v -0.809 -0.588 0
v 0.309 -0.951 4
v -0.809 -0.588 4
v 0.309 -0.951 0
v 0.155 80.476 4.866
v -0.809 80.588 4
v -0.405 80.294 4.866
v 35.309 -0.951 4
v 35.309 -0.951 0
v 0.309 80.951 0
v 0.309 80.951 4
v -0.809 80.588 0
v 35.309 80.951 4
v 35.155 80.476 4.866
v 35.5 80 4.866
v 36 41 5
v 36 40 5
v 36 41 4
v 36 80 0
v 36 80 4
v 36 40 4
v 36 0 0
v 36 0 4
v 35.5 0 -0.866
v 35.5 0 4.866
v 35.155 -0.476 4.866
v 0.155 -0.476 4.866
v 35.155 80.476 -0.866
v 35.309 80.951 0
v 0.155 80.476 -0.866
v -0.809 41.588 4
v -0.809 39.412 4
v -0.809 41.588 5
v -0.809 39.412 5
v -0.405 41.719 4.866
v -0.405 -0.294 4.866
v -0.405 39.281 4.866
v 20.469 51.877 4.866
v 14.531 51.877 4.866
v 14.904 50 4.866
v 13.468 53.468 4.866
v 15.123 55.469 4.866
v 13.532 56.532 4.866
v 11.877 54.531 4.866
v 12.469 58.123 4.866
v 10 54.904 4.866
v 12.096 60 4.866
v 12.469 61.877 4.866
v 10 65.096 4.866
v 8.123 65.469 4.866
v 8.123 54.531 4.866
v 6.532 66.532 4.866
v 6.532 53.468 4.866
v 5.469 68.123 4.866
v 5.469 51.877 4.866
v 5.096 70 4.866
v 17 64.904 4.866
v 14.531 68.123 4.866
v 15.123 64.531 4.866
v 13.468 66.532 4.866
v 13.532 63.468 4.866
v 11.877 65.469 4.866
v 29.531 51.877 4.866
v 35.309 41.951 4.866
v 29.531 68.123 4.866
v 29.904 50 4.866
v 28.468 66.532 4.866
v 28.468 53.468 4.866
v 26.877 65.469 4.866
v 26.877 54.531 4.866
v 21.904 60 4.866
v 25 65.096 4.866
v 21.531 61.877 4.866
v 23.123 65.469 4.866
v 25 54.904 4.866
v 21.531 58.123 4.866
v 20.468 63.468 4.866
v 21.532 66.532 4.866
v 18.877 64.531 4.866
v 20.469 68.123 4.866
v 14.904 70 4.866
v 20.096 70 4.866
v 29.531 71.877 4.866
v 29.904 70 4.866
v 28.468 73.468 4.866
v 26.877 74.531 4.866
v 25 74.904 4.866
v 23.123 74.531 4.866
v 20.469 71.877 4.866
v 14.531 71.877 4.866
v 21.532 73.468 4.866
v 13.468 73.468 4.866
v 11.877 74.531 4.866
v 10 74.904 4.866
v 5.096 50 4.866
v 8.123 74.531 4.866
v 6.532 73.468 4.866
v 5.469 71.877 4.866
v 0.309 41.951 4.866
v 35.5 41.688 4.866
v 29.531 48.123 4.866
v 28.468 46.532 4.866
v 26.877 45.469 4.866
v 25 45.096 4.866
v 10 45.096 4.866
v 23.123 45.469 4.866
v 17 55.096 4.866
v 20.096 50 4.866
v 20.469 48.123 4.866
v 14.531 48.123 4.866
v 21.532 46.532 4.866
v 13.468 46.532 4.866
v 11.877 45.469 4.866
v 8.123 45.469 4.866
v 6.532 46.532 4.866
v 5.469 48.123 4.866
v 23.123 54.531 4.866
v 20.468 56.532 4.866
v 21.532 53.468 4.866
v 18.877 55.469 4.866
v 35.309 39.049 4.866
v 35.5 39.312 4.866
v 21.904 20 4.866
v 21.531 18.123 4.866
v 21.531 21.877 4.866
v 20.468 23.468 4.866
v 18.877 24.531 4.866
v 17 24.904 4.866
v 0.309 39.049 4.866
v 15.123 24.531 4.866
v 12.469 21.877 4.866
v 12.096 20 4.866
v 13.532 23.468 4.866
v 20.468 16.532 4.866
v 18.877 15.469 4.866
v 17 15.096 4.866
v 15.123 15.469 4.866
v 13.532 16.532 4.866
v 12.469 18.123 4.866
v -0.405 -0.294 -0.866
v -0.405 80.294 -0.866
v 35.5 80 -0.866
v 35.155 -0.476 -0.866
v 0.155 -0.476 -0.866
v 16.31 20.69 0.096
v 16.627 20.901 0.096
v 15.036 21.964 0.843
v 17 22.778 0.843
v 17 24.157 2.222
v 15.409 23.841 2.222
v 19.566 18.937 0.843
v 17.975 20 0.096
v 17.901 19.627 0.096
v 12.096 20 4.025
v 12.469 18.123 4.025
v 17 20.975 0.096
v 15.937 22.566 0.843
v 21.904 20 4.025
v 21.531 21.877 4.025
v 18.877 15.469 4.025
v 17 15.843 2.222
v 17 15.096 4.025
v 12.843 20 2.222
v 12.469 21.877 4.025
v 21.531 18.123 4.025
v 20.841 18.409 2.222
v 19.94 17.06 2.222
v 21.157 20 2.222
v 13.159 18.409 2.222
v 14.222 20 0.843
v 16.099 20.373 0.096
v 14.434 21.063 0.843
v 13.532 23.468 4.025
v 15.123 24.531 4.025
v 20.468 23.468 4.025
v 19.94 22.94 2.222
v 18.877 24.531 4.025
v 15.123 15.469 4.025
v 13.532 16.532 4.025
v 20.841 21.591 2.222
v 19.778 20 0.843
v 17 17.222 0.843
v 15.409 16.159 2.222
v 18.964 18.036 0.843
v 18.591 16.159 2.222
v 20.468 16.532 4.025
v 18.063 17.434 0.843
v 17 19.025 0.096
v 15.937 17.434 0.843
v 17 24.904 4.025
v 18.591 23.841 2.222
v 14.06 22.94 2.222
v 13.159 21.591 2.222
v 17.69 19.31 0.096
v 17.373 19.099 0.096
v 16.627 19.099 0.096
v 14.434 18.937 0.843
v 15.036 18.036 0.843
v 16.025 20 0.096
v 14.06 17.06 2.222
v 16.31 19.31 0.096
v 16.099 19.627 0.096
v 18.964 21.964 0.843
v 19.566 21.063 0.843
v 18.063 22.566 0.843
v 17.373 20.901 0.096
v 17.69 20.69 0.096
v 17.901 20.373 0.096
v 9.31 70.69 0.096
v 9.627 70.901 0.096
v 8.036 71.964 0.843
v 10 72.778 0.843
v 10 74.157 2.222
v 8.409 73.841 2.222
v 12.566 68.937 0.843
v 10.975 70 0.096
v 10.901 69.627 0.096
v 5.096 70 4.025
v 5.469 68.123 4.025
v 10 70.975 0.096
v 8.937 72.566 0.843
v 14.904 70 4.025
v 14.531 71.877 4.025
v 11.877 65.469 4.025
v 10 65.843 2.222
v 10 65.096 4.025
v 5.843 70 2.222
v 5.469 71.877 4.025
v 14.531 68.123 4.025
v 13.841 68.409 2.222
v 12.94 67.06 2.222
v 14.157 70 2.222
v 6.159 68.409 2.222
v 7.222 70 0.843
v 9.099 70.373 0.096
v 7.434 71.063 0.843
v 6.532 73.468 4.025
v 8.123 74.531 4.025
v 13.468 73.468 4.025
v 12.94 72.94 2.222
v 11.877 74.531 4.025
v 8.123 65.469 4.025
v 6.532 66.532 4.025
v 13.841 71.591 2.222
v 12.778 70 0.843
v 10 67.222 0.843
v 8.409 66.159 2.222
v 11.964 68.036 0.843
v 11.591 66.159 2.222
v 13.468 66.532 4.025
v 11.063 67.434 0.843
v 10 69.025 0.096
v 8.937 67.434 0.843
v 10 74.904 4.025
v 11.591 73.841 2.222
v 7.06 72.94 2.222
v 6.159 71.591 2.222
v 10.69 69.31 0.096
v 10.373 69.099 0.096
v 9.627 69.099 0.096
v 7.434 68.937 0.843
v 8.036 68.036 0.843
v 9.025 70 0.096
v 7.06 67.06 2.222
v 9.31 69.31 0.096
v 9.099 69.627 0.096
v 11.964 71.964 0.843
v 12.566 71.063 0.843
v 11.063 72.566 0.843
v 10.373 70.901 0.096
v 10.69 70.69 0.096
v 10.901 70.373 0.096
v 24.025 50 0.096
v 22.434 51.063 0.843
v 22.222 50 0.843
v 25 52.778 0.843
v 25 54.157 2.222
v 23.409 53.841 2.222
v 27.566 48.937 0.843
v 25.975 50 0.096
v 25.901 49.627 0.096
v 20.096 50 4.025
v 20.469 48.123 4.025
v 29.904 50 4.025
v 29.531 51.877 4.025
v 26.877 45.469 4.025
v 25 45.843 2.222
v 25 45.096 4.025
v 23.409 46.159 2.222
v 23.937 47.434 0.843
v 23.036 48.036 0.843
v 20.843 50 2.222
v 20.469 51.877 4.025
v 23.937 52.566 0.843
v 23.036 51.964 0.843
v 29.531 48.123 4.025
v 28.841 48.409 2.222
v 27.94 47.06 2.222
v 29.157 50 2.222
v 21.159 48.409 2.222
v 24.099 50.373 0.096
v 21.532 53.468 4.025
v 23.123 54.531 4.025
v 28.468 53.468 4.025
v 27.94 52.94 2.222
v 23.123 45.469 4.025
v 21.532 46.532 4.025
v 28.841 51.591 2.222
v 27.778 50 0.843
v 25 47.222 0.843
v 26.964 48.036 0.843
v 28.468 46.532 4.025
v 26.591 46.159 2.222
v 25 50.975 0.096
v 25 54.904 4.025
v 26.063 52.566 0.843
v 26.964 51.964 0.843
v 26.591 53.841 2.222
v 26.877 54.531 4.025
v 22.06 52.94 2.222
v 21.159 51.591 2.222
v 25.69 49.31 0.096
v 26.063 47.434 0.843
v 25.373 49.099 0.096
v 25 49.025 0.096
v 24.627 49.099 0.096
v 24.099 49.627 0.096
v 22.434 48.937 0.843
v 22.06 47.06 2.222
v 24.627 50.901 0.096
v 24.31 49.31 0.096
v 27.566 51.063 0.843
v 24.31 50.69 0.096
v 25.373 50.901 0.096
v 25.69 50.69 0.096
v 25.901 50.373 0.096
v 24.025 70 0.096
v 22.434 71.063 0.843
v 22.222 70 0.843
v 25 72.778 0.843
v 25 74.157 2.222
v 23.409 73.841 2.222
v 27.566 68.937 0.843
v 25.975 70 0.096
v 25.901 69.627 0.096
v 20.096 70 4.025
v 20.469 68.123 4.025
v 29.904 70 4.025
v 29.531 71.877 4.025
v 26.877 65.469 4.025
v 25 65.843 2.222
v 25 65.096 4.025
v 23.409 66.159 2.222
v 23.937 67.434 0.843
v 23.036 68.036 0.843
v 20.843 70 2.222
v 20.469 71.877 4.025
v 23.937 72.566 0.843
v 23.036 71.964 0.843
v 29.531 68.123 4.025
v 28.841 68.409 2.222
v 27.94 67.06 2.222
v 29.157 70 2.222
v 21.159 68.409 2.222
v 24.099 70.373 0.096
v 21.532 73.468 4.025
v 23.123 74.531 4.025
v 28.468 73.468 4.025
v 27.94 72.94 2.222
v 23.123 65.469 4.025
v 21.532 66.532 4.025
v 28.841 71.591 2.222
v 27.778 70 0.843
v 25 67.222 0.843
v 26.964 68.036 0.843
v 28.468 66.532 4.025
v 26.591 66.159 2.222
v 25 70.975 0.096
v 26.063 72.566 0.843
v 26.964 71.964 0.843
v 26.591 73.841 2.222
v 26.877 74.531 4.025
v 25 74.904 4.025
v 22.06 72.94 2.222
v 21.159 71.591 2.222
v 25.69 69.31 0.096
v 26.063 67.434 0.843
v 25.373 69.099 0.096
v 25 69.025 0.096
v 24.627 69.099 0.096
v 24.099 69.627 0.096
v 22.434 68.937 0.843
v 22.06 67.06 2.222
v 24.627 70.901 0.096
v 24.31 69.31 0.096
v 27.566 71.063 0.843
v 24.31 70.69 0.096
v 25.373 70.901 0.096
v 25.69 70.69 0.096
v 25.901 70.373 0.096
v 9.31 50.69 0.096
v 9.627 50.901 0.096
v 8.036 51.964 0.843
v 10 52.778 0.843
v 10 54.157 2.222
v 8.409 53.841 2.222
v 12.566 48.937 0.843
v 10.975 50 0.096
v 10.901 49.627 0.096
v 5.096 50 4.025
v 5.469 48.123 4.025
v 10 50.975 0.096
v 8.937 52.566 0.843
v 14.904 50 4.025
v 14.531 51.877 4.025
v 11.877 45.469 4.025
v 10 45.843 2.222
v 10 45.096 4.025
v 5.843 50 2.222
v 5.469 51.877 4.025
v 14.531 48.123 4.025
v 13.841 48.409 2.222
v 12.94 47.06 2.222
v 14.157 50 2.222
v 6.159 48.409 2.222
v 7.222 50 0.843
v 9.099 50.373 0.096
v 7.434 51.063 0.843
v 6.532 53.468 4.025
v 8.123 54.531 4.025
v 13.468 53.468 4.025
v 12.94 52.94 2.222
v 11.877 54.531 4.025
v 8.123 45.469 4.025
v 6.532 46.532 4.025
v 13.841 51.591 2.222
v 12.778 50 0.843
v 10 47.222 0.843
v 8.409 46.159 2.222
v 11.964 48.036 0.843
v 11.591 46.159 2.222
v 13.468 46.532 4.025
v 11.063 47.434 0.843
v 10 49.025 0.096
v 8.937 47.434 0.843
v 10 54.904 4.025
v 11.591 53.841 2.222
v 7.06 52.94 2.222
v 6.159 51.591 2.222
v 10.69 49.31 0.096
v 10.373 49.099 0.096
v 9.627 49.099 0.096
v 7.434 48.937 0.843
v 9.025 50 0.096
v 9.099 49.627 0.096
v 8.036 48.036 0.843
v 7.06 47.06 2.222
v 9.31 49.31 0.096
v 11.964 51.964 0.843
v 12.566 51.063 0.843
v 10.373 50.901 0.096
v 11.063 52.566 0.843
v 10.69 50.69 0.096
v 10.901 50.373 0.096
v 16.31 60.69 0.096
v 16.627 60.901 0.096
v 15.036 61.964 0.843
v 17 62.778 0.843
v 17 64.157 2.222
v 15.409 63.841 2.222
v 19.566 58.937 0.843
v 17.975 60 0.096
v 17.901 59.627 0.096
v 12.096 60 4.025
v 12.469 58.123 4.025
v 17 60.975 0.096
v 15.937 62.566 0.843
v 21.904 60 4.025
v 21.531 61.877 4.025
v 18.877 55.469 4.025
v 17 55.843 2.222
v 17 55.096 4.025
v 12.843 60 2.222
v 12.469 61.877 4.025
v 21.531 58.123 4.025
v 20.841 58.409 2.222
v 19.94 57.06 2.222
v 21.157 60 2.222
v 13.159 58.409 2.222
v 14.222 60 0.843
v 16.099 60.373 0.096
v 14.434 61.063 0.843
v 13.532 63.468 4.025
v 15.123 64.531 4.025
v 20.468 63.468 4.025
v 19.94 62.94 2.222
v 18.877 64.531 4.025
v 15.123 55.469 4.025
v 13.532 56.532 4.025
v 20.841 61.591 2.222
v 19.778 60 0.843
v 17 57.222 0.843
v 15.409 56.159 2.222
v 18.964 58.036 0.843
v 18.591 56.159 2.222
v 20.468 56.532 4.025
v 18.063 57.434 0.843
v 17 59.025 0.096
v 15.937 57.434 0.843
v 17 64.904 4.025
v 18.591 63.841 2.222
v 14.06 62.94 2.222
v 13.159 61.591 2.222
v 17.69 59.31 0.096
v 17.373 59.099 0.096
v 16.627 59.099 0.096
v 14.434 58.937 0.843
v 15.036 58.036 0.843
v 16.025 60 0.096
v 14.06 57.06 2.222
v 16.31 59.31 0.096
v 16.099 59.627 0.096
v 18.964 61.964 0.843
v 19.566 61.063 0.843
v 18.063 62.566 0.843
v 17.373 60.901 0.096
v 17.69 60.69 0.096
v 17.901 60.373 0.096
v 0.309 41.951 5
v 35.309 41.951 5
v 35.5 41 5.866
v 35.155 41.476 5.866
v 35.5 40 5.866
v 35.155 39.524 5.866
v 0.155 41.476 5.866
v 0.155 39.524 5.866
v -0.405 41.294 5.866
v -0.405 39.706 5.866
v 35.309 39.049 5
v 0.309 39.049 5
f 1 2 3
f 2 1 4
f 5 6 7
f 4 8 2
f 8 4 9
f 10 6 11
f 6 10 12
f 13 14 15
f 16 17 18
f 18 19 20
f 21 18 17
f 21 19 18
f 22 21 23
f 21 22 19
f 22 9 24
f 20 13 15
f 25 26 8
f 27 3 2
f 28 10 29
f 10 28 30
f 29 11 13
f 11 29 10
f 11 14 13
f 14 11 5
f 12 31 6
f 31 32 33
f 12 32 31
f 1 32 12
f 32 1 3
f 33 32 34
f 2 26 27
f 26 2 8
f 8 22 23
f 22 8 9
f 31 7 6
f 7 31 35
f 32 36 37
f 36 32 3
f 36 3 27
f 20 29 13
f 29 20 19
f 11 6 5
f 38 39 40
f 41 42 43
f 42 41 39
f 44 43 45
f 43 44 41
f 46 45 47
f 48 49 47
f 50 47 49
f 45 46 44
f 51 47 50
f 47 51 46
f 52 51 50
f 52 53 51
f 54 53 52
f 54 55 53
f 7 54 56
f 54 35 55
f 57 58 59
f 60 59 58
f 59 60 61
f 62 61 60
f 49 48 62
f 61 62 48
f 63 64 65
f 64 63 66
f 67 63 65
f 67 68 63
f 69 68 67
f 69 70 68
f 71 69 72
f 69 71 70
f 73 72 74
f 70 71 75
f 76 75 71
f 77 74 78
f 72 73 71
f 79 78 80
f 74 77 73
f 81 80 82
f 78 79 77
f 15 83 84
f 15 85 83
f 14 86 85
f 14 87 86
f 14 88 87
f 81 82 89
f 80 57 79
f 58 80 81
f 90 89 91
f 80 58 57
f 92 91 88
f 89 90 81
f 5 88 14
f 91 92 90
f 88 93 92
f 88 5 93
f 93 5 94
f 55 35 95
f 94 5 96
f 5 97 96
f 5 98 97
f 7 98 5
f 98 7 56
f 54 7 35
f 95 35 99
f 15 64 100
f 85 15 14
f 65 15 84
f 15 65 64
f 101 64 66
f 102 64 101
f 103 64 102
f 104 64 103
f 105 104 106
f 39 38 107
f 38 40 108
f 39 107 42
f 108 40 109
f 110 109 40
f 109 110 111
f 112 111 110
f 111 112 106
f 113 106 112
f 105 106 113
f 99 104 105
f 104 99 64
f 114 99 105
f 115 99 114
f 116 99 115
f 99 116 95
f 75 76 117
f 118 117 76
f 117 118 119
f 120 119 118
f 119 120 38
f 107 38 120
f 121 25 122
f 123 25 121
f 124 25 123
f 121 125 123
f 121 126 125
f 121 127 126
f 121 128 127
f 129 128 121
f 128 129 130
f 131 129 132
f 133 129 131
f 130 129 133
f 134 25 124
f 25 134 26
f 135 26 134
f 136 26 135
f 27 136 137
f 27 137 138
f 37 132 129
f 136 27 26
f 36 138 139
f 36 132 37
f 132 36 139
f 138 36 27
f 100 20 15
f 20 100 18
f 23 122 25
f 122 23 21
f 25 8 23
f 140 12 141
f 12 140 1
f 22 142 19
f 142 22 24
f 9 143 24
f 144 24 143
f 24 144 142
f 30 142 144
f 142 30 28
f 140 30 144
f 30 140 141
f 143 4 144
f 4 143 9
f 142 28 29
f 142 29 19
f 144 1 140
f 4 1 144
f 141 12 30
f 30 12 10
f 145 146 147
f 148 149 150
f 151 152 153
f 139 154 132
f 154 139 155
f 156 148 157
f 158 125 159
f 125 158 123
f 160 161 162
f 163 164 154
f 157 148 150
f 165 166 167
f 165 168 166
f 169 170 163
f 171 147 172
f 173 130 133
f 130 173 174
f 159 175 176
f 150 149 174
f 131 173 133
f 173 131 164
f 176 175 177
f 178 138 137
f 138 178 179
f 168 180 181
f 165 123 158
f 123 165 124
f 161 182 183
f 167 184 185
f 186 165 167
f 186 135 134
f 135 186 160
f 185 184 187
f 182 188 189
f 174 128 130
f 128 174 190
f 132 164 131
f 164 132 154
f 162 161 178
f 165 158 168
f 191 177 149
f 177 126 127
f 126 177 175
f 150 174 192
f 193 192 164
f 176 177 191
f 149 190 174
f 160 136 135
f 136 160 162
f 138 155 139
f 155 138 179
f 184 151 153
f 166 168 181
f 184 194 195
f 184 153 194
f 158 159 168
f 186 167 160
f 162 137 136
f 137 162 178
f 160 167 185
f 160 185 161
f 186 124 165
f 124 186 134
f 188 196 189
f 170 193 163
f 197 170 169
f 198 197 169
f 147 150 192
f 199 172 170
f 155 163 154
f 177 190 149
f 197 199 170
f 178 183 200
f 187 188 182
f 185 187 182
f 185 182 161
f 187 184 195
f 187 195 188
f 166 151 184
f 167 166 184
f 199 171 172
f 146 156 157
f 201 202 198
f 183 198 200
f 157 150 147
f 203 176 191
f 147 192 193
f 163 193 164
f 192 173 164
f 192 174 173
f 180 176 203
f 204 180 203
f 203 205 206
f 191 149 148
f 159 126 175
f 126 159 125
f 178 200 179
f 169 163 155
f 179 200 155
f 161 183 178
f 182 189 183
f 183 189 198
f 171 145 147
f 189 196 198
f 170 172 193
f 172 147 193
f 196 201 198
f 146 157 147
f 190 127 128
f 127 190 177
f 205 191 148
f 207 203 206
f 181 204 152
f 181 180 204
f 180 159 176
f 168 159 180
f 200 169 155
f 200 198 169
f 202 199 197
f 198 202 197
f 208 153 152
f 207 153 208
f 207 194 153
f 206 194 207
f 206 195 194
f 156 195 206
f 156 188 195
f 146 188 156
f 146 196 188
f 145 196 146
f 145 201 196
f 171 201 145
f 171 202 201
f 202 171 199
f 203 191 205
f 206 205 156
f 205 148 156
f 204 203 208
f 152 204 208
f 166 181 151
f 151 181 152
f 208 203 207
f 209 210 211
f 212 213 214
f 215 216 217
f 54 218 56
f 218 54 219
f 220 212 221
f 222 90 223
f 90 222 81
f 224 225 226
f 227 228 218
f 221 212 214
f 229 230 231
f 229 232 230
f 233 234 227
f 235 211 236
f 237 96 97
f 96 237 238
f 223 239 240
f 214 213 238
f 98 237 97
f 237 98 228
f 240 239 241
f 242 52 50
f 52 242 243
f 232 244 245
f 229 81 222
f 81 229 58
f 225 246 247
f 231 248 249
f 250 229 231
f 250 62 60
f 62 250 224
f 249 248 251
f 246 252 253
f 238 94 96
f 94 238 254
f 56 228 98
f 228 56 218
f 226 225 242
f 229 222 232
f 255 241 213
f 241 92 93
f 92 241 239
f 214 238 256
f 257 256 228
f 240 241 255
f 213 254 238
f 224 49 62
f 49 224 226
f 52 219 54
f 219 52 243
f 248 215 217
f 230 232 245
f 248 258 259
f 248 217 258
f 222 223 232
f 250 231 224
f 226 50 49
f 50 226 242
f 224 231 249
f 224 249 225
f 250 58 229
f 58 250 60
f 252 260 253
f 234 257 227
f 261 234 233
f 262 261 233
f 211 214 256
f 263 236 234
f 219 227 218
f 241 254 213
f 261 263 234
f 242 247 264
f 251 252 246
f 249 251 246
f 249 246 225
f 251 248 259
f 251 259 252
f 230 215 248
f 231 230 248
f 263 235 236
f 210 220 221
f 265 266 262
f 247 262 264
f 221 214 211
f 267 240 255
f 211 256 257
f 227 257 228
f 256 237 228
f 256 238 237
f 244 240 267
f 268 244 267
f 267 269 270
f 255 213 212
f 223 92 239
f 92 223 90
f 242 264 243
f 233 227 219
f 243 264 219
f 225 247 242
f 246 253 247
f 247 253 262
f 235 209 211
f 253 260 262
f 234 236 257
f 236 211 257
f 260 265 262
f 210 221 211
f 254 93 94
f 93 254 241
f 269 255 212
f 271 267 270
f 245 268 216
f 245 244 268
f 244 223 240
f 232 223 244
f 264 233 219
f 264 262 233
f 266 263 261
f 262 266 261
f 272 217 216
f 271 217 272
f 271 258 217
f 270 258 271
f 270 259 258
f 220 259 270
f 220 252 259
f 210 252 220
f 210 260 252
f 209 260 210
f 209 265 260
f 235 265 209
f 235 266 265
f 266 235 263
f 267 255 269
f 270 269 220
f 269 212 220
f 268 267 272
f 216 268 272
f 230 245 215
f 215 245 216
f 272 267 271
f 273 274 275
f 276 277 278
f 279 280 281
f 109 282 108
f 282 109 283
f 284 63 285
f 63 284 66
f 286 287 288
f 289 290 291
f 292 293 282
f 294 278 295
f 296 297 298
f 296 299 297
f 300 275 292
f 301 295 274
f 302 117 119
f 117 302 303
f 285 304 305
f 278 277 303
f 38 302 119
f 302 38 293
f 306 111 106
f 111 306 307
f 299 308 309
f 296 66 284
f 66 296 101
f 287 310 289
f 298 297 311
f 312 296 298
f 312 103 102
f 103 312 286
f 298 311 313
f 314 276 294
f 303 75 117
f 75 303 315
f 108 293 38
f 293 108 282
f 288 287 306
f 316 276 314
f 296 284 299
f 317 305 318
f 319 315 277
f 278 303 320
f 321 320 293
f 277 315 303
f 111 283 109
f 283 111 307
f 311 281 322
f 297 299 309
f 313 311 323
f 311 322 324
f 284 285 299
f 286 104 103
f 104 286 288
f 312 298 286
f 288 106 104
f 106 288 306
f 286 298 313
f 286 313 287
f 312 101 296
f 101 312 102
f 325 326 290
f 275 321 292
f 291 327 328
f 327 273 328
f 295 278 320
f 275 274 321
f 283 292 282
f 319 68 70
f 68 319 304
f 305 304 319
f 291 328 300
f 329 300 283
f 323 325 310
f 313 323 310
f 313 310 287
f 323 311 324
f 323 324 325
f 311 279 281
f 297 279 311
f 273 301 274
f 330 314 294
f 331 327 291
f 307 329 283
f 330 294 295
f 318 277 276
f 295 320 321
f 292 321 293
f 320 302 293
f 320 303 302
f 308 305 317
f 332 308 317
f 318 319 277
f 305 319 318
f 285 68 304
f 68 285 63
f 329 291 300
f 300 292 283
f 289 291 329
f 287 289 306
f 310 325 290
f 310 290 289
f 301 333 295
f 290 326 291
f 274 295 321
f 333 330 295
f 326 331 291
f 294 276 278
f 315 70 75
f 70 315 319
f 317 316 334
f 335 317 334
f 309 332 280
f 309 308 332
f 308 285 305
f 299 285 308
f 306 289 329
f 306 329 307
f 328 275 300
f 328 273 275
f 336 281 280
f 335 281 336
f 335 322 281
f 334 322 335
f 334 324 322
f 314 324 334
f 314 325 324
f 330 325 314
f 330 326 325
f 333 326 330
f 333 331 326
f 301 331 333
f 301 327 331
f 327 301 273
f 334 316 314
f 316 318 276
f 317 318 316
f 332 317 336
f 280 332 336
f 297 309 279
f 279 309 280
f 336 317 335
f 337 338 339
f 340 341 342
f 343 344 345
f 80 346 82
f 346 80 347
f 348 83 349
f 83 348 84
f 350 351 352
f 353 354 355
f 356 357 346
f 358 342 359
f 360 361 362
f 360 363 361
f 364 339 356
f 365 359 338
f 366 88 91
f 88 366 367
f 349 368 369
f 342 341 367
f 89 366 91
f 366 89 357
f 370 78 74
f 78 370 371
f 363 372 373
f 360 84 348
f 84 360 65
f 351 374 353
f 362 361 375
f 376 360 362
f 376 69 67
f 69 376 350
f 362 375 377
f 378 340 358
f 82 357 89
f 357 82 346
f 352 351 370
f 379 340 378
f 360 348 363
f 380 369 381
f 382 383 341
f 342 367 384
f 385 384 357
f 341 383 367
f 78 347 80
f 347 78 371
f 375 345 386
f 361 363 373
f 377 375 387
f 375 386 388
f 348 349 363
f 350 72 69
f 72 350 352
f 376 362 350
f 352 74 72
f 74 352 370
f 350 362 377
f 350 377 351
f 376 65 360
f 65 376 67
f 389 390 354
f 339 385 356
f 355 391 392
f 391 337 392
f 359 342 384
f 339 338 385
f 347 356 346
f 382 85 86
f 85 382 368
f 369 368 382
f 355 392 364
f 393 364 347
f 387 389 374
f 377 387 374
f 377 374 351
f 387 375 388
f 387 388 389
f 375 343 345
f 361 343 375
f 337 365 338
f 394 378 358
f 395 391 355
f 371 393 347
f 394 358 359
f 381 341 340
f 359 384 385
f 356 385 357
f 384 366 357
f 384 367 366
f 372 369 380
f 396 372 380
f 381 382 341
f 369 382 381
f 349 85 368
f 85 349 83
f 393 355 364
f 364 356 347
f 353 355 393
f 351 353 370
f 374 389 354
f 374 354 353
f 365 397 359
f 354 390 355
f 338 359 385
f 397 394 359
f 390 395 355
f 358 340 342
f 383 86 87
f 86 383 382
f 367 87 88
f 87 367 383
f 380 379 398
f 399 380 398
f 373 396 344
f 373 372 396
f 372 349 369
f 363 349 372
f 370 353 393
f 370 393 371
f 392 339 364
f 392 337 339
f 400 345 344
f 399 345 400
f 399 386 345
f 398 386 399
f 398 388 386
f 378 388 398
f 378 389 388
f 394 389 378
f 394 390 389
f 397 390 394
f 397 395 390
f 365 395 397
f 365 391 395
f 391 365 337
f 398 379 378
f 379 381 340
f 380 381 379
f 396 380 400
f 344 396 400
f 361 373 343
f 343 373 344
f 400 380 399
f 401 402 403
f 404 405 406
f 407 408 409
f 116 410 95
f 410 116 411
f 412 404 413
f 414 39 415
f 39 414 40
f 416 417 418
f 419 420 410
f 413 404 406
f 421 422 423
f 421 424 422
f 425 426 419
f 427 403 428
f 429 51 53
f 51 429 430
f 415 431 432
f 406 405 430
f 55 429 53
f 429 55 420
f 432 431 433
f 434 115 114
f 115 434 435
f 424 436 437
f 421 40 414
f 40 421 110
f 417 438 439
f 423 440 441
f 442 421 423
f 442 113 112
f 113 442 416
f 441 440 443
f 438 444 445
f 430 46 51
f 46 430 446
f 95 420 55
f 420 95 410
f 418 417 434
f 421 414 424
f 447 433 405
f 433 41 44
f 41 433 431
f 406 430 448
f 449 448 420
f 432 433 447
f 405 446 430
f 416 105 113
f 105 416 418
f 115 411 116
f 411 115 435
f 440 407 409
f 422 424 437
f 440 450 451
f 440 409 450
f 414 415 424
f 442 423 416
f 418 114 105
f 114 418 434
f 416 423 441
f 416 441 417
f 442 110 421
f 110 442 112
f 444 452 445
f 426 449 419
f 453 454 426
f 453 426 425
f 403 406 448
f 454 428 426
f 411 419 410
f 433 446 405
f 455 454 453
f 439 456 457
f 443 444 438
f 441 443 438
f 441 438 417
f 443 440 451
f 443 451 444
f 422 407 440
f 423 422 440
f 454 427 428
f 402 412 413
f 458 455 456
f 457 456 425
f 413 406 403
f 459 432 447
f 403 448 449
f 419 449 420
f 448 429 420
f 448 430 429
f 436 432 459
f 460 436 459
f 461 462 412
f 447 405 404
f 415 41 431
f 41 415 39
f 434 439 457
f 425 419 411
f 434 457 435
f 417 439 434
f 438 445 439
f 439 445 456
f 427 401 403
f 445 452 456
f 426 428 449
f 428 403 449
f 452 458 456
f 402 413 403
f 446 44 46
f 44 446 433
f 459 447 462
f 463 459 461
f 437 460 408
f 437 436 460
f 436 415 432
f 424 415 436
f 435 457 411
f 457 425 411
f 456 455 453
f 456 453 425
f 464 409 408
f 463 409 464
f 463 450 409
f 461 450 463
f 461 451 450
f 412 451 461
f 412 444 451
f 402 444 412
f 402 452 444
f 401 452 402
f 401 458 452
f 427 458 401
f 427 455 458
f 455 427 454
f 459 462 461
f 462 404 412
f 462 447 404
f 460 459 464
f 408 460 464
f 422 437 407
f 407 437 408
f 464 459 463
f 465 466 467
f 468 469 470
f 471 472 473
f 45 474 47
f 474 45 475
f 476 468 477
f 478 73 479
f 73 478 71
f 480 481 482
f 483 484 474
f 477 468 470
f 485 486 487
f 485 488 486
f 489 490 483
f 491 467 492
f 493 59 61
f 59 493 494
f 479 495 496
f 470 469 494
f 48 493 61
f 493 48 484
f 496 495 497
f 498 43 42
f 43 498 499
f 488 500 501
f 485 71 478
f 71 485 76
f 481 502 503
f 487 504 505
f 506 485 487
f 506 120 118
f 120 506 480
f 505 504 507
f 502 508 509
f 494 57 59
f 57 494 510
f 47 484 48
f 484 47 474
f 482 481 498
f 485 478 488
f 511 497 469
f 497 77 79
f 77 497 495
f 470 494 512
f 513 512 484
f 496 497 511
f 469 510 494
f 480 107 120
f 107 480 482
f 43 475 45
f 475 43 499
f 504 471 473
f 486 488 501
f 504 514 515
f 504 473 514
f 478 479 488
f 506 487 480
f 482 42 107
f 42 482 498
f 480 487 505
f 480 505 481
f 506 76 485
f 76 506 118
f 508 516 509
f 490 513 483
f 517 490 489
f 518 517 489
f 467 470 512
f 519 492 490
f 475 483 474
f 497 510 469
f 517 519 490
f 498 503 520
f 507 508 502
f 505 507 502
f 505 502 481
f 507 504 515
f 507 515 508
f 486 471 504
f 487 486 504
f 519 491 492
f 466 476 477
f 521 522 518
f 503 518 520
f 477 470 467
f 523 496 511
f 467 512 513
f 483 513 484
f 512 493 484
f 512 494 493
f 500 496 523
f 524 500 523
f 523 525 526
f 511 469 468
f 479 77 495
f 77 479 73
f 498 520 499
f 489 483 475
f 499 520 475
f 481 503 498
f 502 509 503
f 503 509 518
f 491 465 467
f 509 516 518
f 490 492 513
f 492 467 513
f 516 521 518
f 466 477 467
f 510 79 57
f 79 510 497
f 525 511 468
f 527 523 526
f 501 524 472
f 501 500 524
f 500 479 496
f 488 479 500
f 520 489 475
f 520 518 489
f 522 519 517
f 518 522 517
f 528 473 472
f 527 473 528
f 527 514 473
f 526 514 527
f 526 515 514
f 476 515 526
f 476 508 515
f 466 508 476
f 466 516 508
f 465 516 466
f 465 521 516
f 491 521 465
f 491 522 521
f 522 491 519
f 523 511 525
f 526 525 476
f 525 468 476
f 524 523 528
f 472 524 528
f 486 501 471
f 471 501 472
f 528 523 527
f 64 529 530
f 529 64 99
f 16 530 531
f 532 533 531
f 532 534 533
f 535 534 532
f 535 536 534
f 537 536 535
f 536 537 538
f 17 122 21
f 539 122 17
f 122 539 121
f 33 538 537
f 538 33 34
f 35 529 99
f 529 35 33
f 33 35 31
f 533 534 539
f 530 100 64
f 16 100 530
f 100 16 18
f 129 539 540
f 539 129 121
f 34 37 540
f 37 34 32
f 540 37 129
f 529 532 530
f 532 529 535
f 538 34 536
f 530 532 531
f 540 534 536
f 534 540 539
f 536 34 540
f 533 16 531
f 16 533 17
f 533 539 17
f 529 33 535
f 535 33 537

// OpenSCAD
// Loguncov Maxim 13.12.13


//$fn=128;


translate([0,40,0])
minkowski()
{cube([35,1,5]);
sphere(1);
}

difference() {

//основа
minkowski()
{cube([35,80,4]);
sphere(1);
}

//отверстия
translate([17,20,5])sphere(5);

translate([10,70,5])sphere(5);
translate([25,50,5])sphere(5);
translate([25,70,5])sphere(5);
translate([10,50,5])sphere(5);
translate([17,60,5])sphere(5);



}
